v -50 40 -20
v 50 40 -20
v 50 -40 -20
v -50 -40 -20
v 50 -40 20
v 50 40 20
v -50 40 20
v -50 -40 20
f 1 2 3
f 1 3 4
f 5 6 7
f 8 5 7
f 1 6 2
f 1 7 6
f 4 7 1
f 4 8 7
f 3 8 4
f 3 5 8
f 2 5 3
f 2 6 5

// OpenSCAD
module rprizma(sizes, mm=10, mp=15, pp=20, pm=25){
    
    xd = sizes[0]/2;
    yd = sizes[1]/2;
    
    union(){
        if(mm>0){
            translate([-(xd-mm),-(yd-mm),0]){
                cylinder(h=sizes[2], r=mm, center=true,$fs=0.5);
            }
        }
        
        if(mp>0){
            translate([-(xd-mp),(yd-mp),0]){
                cylinder(h=sizes[2], r=mp, center=true,$fs=0.5);
            }
        }
        
        if(pp>0){
            translate([(xd-pp),(yd-pp),0]){
                cylinder(h=sizes[2], r=pp, center=true,$fs=0.5);
            }
        }
        
        if(pm>0){
            translate([(xd-pm),-(yd-pm),0]){
                cylinder(h=sizes[2], r=pm, center=true,$fs=0.5);
            }
        }
        
        linear_extrude(height=sizes[2],center=true){
            polygon(points=[
                [-(xd-mm), -yd],
                [-xd, -(yd-mm)],
                [-xd, yd-mp],
                [-(xd-mp), yd],
                [xd-pp,yd],
                [xd,yd-pp],
                [xd,-(yd-pm)],
                [xd-pm, -yd]
            ]);
        }
    }

}

rprizma([100,80,40],mm=0,mp=0,pp=0,pm=0);
//%cube([100,80,40], center=true);
